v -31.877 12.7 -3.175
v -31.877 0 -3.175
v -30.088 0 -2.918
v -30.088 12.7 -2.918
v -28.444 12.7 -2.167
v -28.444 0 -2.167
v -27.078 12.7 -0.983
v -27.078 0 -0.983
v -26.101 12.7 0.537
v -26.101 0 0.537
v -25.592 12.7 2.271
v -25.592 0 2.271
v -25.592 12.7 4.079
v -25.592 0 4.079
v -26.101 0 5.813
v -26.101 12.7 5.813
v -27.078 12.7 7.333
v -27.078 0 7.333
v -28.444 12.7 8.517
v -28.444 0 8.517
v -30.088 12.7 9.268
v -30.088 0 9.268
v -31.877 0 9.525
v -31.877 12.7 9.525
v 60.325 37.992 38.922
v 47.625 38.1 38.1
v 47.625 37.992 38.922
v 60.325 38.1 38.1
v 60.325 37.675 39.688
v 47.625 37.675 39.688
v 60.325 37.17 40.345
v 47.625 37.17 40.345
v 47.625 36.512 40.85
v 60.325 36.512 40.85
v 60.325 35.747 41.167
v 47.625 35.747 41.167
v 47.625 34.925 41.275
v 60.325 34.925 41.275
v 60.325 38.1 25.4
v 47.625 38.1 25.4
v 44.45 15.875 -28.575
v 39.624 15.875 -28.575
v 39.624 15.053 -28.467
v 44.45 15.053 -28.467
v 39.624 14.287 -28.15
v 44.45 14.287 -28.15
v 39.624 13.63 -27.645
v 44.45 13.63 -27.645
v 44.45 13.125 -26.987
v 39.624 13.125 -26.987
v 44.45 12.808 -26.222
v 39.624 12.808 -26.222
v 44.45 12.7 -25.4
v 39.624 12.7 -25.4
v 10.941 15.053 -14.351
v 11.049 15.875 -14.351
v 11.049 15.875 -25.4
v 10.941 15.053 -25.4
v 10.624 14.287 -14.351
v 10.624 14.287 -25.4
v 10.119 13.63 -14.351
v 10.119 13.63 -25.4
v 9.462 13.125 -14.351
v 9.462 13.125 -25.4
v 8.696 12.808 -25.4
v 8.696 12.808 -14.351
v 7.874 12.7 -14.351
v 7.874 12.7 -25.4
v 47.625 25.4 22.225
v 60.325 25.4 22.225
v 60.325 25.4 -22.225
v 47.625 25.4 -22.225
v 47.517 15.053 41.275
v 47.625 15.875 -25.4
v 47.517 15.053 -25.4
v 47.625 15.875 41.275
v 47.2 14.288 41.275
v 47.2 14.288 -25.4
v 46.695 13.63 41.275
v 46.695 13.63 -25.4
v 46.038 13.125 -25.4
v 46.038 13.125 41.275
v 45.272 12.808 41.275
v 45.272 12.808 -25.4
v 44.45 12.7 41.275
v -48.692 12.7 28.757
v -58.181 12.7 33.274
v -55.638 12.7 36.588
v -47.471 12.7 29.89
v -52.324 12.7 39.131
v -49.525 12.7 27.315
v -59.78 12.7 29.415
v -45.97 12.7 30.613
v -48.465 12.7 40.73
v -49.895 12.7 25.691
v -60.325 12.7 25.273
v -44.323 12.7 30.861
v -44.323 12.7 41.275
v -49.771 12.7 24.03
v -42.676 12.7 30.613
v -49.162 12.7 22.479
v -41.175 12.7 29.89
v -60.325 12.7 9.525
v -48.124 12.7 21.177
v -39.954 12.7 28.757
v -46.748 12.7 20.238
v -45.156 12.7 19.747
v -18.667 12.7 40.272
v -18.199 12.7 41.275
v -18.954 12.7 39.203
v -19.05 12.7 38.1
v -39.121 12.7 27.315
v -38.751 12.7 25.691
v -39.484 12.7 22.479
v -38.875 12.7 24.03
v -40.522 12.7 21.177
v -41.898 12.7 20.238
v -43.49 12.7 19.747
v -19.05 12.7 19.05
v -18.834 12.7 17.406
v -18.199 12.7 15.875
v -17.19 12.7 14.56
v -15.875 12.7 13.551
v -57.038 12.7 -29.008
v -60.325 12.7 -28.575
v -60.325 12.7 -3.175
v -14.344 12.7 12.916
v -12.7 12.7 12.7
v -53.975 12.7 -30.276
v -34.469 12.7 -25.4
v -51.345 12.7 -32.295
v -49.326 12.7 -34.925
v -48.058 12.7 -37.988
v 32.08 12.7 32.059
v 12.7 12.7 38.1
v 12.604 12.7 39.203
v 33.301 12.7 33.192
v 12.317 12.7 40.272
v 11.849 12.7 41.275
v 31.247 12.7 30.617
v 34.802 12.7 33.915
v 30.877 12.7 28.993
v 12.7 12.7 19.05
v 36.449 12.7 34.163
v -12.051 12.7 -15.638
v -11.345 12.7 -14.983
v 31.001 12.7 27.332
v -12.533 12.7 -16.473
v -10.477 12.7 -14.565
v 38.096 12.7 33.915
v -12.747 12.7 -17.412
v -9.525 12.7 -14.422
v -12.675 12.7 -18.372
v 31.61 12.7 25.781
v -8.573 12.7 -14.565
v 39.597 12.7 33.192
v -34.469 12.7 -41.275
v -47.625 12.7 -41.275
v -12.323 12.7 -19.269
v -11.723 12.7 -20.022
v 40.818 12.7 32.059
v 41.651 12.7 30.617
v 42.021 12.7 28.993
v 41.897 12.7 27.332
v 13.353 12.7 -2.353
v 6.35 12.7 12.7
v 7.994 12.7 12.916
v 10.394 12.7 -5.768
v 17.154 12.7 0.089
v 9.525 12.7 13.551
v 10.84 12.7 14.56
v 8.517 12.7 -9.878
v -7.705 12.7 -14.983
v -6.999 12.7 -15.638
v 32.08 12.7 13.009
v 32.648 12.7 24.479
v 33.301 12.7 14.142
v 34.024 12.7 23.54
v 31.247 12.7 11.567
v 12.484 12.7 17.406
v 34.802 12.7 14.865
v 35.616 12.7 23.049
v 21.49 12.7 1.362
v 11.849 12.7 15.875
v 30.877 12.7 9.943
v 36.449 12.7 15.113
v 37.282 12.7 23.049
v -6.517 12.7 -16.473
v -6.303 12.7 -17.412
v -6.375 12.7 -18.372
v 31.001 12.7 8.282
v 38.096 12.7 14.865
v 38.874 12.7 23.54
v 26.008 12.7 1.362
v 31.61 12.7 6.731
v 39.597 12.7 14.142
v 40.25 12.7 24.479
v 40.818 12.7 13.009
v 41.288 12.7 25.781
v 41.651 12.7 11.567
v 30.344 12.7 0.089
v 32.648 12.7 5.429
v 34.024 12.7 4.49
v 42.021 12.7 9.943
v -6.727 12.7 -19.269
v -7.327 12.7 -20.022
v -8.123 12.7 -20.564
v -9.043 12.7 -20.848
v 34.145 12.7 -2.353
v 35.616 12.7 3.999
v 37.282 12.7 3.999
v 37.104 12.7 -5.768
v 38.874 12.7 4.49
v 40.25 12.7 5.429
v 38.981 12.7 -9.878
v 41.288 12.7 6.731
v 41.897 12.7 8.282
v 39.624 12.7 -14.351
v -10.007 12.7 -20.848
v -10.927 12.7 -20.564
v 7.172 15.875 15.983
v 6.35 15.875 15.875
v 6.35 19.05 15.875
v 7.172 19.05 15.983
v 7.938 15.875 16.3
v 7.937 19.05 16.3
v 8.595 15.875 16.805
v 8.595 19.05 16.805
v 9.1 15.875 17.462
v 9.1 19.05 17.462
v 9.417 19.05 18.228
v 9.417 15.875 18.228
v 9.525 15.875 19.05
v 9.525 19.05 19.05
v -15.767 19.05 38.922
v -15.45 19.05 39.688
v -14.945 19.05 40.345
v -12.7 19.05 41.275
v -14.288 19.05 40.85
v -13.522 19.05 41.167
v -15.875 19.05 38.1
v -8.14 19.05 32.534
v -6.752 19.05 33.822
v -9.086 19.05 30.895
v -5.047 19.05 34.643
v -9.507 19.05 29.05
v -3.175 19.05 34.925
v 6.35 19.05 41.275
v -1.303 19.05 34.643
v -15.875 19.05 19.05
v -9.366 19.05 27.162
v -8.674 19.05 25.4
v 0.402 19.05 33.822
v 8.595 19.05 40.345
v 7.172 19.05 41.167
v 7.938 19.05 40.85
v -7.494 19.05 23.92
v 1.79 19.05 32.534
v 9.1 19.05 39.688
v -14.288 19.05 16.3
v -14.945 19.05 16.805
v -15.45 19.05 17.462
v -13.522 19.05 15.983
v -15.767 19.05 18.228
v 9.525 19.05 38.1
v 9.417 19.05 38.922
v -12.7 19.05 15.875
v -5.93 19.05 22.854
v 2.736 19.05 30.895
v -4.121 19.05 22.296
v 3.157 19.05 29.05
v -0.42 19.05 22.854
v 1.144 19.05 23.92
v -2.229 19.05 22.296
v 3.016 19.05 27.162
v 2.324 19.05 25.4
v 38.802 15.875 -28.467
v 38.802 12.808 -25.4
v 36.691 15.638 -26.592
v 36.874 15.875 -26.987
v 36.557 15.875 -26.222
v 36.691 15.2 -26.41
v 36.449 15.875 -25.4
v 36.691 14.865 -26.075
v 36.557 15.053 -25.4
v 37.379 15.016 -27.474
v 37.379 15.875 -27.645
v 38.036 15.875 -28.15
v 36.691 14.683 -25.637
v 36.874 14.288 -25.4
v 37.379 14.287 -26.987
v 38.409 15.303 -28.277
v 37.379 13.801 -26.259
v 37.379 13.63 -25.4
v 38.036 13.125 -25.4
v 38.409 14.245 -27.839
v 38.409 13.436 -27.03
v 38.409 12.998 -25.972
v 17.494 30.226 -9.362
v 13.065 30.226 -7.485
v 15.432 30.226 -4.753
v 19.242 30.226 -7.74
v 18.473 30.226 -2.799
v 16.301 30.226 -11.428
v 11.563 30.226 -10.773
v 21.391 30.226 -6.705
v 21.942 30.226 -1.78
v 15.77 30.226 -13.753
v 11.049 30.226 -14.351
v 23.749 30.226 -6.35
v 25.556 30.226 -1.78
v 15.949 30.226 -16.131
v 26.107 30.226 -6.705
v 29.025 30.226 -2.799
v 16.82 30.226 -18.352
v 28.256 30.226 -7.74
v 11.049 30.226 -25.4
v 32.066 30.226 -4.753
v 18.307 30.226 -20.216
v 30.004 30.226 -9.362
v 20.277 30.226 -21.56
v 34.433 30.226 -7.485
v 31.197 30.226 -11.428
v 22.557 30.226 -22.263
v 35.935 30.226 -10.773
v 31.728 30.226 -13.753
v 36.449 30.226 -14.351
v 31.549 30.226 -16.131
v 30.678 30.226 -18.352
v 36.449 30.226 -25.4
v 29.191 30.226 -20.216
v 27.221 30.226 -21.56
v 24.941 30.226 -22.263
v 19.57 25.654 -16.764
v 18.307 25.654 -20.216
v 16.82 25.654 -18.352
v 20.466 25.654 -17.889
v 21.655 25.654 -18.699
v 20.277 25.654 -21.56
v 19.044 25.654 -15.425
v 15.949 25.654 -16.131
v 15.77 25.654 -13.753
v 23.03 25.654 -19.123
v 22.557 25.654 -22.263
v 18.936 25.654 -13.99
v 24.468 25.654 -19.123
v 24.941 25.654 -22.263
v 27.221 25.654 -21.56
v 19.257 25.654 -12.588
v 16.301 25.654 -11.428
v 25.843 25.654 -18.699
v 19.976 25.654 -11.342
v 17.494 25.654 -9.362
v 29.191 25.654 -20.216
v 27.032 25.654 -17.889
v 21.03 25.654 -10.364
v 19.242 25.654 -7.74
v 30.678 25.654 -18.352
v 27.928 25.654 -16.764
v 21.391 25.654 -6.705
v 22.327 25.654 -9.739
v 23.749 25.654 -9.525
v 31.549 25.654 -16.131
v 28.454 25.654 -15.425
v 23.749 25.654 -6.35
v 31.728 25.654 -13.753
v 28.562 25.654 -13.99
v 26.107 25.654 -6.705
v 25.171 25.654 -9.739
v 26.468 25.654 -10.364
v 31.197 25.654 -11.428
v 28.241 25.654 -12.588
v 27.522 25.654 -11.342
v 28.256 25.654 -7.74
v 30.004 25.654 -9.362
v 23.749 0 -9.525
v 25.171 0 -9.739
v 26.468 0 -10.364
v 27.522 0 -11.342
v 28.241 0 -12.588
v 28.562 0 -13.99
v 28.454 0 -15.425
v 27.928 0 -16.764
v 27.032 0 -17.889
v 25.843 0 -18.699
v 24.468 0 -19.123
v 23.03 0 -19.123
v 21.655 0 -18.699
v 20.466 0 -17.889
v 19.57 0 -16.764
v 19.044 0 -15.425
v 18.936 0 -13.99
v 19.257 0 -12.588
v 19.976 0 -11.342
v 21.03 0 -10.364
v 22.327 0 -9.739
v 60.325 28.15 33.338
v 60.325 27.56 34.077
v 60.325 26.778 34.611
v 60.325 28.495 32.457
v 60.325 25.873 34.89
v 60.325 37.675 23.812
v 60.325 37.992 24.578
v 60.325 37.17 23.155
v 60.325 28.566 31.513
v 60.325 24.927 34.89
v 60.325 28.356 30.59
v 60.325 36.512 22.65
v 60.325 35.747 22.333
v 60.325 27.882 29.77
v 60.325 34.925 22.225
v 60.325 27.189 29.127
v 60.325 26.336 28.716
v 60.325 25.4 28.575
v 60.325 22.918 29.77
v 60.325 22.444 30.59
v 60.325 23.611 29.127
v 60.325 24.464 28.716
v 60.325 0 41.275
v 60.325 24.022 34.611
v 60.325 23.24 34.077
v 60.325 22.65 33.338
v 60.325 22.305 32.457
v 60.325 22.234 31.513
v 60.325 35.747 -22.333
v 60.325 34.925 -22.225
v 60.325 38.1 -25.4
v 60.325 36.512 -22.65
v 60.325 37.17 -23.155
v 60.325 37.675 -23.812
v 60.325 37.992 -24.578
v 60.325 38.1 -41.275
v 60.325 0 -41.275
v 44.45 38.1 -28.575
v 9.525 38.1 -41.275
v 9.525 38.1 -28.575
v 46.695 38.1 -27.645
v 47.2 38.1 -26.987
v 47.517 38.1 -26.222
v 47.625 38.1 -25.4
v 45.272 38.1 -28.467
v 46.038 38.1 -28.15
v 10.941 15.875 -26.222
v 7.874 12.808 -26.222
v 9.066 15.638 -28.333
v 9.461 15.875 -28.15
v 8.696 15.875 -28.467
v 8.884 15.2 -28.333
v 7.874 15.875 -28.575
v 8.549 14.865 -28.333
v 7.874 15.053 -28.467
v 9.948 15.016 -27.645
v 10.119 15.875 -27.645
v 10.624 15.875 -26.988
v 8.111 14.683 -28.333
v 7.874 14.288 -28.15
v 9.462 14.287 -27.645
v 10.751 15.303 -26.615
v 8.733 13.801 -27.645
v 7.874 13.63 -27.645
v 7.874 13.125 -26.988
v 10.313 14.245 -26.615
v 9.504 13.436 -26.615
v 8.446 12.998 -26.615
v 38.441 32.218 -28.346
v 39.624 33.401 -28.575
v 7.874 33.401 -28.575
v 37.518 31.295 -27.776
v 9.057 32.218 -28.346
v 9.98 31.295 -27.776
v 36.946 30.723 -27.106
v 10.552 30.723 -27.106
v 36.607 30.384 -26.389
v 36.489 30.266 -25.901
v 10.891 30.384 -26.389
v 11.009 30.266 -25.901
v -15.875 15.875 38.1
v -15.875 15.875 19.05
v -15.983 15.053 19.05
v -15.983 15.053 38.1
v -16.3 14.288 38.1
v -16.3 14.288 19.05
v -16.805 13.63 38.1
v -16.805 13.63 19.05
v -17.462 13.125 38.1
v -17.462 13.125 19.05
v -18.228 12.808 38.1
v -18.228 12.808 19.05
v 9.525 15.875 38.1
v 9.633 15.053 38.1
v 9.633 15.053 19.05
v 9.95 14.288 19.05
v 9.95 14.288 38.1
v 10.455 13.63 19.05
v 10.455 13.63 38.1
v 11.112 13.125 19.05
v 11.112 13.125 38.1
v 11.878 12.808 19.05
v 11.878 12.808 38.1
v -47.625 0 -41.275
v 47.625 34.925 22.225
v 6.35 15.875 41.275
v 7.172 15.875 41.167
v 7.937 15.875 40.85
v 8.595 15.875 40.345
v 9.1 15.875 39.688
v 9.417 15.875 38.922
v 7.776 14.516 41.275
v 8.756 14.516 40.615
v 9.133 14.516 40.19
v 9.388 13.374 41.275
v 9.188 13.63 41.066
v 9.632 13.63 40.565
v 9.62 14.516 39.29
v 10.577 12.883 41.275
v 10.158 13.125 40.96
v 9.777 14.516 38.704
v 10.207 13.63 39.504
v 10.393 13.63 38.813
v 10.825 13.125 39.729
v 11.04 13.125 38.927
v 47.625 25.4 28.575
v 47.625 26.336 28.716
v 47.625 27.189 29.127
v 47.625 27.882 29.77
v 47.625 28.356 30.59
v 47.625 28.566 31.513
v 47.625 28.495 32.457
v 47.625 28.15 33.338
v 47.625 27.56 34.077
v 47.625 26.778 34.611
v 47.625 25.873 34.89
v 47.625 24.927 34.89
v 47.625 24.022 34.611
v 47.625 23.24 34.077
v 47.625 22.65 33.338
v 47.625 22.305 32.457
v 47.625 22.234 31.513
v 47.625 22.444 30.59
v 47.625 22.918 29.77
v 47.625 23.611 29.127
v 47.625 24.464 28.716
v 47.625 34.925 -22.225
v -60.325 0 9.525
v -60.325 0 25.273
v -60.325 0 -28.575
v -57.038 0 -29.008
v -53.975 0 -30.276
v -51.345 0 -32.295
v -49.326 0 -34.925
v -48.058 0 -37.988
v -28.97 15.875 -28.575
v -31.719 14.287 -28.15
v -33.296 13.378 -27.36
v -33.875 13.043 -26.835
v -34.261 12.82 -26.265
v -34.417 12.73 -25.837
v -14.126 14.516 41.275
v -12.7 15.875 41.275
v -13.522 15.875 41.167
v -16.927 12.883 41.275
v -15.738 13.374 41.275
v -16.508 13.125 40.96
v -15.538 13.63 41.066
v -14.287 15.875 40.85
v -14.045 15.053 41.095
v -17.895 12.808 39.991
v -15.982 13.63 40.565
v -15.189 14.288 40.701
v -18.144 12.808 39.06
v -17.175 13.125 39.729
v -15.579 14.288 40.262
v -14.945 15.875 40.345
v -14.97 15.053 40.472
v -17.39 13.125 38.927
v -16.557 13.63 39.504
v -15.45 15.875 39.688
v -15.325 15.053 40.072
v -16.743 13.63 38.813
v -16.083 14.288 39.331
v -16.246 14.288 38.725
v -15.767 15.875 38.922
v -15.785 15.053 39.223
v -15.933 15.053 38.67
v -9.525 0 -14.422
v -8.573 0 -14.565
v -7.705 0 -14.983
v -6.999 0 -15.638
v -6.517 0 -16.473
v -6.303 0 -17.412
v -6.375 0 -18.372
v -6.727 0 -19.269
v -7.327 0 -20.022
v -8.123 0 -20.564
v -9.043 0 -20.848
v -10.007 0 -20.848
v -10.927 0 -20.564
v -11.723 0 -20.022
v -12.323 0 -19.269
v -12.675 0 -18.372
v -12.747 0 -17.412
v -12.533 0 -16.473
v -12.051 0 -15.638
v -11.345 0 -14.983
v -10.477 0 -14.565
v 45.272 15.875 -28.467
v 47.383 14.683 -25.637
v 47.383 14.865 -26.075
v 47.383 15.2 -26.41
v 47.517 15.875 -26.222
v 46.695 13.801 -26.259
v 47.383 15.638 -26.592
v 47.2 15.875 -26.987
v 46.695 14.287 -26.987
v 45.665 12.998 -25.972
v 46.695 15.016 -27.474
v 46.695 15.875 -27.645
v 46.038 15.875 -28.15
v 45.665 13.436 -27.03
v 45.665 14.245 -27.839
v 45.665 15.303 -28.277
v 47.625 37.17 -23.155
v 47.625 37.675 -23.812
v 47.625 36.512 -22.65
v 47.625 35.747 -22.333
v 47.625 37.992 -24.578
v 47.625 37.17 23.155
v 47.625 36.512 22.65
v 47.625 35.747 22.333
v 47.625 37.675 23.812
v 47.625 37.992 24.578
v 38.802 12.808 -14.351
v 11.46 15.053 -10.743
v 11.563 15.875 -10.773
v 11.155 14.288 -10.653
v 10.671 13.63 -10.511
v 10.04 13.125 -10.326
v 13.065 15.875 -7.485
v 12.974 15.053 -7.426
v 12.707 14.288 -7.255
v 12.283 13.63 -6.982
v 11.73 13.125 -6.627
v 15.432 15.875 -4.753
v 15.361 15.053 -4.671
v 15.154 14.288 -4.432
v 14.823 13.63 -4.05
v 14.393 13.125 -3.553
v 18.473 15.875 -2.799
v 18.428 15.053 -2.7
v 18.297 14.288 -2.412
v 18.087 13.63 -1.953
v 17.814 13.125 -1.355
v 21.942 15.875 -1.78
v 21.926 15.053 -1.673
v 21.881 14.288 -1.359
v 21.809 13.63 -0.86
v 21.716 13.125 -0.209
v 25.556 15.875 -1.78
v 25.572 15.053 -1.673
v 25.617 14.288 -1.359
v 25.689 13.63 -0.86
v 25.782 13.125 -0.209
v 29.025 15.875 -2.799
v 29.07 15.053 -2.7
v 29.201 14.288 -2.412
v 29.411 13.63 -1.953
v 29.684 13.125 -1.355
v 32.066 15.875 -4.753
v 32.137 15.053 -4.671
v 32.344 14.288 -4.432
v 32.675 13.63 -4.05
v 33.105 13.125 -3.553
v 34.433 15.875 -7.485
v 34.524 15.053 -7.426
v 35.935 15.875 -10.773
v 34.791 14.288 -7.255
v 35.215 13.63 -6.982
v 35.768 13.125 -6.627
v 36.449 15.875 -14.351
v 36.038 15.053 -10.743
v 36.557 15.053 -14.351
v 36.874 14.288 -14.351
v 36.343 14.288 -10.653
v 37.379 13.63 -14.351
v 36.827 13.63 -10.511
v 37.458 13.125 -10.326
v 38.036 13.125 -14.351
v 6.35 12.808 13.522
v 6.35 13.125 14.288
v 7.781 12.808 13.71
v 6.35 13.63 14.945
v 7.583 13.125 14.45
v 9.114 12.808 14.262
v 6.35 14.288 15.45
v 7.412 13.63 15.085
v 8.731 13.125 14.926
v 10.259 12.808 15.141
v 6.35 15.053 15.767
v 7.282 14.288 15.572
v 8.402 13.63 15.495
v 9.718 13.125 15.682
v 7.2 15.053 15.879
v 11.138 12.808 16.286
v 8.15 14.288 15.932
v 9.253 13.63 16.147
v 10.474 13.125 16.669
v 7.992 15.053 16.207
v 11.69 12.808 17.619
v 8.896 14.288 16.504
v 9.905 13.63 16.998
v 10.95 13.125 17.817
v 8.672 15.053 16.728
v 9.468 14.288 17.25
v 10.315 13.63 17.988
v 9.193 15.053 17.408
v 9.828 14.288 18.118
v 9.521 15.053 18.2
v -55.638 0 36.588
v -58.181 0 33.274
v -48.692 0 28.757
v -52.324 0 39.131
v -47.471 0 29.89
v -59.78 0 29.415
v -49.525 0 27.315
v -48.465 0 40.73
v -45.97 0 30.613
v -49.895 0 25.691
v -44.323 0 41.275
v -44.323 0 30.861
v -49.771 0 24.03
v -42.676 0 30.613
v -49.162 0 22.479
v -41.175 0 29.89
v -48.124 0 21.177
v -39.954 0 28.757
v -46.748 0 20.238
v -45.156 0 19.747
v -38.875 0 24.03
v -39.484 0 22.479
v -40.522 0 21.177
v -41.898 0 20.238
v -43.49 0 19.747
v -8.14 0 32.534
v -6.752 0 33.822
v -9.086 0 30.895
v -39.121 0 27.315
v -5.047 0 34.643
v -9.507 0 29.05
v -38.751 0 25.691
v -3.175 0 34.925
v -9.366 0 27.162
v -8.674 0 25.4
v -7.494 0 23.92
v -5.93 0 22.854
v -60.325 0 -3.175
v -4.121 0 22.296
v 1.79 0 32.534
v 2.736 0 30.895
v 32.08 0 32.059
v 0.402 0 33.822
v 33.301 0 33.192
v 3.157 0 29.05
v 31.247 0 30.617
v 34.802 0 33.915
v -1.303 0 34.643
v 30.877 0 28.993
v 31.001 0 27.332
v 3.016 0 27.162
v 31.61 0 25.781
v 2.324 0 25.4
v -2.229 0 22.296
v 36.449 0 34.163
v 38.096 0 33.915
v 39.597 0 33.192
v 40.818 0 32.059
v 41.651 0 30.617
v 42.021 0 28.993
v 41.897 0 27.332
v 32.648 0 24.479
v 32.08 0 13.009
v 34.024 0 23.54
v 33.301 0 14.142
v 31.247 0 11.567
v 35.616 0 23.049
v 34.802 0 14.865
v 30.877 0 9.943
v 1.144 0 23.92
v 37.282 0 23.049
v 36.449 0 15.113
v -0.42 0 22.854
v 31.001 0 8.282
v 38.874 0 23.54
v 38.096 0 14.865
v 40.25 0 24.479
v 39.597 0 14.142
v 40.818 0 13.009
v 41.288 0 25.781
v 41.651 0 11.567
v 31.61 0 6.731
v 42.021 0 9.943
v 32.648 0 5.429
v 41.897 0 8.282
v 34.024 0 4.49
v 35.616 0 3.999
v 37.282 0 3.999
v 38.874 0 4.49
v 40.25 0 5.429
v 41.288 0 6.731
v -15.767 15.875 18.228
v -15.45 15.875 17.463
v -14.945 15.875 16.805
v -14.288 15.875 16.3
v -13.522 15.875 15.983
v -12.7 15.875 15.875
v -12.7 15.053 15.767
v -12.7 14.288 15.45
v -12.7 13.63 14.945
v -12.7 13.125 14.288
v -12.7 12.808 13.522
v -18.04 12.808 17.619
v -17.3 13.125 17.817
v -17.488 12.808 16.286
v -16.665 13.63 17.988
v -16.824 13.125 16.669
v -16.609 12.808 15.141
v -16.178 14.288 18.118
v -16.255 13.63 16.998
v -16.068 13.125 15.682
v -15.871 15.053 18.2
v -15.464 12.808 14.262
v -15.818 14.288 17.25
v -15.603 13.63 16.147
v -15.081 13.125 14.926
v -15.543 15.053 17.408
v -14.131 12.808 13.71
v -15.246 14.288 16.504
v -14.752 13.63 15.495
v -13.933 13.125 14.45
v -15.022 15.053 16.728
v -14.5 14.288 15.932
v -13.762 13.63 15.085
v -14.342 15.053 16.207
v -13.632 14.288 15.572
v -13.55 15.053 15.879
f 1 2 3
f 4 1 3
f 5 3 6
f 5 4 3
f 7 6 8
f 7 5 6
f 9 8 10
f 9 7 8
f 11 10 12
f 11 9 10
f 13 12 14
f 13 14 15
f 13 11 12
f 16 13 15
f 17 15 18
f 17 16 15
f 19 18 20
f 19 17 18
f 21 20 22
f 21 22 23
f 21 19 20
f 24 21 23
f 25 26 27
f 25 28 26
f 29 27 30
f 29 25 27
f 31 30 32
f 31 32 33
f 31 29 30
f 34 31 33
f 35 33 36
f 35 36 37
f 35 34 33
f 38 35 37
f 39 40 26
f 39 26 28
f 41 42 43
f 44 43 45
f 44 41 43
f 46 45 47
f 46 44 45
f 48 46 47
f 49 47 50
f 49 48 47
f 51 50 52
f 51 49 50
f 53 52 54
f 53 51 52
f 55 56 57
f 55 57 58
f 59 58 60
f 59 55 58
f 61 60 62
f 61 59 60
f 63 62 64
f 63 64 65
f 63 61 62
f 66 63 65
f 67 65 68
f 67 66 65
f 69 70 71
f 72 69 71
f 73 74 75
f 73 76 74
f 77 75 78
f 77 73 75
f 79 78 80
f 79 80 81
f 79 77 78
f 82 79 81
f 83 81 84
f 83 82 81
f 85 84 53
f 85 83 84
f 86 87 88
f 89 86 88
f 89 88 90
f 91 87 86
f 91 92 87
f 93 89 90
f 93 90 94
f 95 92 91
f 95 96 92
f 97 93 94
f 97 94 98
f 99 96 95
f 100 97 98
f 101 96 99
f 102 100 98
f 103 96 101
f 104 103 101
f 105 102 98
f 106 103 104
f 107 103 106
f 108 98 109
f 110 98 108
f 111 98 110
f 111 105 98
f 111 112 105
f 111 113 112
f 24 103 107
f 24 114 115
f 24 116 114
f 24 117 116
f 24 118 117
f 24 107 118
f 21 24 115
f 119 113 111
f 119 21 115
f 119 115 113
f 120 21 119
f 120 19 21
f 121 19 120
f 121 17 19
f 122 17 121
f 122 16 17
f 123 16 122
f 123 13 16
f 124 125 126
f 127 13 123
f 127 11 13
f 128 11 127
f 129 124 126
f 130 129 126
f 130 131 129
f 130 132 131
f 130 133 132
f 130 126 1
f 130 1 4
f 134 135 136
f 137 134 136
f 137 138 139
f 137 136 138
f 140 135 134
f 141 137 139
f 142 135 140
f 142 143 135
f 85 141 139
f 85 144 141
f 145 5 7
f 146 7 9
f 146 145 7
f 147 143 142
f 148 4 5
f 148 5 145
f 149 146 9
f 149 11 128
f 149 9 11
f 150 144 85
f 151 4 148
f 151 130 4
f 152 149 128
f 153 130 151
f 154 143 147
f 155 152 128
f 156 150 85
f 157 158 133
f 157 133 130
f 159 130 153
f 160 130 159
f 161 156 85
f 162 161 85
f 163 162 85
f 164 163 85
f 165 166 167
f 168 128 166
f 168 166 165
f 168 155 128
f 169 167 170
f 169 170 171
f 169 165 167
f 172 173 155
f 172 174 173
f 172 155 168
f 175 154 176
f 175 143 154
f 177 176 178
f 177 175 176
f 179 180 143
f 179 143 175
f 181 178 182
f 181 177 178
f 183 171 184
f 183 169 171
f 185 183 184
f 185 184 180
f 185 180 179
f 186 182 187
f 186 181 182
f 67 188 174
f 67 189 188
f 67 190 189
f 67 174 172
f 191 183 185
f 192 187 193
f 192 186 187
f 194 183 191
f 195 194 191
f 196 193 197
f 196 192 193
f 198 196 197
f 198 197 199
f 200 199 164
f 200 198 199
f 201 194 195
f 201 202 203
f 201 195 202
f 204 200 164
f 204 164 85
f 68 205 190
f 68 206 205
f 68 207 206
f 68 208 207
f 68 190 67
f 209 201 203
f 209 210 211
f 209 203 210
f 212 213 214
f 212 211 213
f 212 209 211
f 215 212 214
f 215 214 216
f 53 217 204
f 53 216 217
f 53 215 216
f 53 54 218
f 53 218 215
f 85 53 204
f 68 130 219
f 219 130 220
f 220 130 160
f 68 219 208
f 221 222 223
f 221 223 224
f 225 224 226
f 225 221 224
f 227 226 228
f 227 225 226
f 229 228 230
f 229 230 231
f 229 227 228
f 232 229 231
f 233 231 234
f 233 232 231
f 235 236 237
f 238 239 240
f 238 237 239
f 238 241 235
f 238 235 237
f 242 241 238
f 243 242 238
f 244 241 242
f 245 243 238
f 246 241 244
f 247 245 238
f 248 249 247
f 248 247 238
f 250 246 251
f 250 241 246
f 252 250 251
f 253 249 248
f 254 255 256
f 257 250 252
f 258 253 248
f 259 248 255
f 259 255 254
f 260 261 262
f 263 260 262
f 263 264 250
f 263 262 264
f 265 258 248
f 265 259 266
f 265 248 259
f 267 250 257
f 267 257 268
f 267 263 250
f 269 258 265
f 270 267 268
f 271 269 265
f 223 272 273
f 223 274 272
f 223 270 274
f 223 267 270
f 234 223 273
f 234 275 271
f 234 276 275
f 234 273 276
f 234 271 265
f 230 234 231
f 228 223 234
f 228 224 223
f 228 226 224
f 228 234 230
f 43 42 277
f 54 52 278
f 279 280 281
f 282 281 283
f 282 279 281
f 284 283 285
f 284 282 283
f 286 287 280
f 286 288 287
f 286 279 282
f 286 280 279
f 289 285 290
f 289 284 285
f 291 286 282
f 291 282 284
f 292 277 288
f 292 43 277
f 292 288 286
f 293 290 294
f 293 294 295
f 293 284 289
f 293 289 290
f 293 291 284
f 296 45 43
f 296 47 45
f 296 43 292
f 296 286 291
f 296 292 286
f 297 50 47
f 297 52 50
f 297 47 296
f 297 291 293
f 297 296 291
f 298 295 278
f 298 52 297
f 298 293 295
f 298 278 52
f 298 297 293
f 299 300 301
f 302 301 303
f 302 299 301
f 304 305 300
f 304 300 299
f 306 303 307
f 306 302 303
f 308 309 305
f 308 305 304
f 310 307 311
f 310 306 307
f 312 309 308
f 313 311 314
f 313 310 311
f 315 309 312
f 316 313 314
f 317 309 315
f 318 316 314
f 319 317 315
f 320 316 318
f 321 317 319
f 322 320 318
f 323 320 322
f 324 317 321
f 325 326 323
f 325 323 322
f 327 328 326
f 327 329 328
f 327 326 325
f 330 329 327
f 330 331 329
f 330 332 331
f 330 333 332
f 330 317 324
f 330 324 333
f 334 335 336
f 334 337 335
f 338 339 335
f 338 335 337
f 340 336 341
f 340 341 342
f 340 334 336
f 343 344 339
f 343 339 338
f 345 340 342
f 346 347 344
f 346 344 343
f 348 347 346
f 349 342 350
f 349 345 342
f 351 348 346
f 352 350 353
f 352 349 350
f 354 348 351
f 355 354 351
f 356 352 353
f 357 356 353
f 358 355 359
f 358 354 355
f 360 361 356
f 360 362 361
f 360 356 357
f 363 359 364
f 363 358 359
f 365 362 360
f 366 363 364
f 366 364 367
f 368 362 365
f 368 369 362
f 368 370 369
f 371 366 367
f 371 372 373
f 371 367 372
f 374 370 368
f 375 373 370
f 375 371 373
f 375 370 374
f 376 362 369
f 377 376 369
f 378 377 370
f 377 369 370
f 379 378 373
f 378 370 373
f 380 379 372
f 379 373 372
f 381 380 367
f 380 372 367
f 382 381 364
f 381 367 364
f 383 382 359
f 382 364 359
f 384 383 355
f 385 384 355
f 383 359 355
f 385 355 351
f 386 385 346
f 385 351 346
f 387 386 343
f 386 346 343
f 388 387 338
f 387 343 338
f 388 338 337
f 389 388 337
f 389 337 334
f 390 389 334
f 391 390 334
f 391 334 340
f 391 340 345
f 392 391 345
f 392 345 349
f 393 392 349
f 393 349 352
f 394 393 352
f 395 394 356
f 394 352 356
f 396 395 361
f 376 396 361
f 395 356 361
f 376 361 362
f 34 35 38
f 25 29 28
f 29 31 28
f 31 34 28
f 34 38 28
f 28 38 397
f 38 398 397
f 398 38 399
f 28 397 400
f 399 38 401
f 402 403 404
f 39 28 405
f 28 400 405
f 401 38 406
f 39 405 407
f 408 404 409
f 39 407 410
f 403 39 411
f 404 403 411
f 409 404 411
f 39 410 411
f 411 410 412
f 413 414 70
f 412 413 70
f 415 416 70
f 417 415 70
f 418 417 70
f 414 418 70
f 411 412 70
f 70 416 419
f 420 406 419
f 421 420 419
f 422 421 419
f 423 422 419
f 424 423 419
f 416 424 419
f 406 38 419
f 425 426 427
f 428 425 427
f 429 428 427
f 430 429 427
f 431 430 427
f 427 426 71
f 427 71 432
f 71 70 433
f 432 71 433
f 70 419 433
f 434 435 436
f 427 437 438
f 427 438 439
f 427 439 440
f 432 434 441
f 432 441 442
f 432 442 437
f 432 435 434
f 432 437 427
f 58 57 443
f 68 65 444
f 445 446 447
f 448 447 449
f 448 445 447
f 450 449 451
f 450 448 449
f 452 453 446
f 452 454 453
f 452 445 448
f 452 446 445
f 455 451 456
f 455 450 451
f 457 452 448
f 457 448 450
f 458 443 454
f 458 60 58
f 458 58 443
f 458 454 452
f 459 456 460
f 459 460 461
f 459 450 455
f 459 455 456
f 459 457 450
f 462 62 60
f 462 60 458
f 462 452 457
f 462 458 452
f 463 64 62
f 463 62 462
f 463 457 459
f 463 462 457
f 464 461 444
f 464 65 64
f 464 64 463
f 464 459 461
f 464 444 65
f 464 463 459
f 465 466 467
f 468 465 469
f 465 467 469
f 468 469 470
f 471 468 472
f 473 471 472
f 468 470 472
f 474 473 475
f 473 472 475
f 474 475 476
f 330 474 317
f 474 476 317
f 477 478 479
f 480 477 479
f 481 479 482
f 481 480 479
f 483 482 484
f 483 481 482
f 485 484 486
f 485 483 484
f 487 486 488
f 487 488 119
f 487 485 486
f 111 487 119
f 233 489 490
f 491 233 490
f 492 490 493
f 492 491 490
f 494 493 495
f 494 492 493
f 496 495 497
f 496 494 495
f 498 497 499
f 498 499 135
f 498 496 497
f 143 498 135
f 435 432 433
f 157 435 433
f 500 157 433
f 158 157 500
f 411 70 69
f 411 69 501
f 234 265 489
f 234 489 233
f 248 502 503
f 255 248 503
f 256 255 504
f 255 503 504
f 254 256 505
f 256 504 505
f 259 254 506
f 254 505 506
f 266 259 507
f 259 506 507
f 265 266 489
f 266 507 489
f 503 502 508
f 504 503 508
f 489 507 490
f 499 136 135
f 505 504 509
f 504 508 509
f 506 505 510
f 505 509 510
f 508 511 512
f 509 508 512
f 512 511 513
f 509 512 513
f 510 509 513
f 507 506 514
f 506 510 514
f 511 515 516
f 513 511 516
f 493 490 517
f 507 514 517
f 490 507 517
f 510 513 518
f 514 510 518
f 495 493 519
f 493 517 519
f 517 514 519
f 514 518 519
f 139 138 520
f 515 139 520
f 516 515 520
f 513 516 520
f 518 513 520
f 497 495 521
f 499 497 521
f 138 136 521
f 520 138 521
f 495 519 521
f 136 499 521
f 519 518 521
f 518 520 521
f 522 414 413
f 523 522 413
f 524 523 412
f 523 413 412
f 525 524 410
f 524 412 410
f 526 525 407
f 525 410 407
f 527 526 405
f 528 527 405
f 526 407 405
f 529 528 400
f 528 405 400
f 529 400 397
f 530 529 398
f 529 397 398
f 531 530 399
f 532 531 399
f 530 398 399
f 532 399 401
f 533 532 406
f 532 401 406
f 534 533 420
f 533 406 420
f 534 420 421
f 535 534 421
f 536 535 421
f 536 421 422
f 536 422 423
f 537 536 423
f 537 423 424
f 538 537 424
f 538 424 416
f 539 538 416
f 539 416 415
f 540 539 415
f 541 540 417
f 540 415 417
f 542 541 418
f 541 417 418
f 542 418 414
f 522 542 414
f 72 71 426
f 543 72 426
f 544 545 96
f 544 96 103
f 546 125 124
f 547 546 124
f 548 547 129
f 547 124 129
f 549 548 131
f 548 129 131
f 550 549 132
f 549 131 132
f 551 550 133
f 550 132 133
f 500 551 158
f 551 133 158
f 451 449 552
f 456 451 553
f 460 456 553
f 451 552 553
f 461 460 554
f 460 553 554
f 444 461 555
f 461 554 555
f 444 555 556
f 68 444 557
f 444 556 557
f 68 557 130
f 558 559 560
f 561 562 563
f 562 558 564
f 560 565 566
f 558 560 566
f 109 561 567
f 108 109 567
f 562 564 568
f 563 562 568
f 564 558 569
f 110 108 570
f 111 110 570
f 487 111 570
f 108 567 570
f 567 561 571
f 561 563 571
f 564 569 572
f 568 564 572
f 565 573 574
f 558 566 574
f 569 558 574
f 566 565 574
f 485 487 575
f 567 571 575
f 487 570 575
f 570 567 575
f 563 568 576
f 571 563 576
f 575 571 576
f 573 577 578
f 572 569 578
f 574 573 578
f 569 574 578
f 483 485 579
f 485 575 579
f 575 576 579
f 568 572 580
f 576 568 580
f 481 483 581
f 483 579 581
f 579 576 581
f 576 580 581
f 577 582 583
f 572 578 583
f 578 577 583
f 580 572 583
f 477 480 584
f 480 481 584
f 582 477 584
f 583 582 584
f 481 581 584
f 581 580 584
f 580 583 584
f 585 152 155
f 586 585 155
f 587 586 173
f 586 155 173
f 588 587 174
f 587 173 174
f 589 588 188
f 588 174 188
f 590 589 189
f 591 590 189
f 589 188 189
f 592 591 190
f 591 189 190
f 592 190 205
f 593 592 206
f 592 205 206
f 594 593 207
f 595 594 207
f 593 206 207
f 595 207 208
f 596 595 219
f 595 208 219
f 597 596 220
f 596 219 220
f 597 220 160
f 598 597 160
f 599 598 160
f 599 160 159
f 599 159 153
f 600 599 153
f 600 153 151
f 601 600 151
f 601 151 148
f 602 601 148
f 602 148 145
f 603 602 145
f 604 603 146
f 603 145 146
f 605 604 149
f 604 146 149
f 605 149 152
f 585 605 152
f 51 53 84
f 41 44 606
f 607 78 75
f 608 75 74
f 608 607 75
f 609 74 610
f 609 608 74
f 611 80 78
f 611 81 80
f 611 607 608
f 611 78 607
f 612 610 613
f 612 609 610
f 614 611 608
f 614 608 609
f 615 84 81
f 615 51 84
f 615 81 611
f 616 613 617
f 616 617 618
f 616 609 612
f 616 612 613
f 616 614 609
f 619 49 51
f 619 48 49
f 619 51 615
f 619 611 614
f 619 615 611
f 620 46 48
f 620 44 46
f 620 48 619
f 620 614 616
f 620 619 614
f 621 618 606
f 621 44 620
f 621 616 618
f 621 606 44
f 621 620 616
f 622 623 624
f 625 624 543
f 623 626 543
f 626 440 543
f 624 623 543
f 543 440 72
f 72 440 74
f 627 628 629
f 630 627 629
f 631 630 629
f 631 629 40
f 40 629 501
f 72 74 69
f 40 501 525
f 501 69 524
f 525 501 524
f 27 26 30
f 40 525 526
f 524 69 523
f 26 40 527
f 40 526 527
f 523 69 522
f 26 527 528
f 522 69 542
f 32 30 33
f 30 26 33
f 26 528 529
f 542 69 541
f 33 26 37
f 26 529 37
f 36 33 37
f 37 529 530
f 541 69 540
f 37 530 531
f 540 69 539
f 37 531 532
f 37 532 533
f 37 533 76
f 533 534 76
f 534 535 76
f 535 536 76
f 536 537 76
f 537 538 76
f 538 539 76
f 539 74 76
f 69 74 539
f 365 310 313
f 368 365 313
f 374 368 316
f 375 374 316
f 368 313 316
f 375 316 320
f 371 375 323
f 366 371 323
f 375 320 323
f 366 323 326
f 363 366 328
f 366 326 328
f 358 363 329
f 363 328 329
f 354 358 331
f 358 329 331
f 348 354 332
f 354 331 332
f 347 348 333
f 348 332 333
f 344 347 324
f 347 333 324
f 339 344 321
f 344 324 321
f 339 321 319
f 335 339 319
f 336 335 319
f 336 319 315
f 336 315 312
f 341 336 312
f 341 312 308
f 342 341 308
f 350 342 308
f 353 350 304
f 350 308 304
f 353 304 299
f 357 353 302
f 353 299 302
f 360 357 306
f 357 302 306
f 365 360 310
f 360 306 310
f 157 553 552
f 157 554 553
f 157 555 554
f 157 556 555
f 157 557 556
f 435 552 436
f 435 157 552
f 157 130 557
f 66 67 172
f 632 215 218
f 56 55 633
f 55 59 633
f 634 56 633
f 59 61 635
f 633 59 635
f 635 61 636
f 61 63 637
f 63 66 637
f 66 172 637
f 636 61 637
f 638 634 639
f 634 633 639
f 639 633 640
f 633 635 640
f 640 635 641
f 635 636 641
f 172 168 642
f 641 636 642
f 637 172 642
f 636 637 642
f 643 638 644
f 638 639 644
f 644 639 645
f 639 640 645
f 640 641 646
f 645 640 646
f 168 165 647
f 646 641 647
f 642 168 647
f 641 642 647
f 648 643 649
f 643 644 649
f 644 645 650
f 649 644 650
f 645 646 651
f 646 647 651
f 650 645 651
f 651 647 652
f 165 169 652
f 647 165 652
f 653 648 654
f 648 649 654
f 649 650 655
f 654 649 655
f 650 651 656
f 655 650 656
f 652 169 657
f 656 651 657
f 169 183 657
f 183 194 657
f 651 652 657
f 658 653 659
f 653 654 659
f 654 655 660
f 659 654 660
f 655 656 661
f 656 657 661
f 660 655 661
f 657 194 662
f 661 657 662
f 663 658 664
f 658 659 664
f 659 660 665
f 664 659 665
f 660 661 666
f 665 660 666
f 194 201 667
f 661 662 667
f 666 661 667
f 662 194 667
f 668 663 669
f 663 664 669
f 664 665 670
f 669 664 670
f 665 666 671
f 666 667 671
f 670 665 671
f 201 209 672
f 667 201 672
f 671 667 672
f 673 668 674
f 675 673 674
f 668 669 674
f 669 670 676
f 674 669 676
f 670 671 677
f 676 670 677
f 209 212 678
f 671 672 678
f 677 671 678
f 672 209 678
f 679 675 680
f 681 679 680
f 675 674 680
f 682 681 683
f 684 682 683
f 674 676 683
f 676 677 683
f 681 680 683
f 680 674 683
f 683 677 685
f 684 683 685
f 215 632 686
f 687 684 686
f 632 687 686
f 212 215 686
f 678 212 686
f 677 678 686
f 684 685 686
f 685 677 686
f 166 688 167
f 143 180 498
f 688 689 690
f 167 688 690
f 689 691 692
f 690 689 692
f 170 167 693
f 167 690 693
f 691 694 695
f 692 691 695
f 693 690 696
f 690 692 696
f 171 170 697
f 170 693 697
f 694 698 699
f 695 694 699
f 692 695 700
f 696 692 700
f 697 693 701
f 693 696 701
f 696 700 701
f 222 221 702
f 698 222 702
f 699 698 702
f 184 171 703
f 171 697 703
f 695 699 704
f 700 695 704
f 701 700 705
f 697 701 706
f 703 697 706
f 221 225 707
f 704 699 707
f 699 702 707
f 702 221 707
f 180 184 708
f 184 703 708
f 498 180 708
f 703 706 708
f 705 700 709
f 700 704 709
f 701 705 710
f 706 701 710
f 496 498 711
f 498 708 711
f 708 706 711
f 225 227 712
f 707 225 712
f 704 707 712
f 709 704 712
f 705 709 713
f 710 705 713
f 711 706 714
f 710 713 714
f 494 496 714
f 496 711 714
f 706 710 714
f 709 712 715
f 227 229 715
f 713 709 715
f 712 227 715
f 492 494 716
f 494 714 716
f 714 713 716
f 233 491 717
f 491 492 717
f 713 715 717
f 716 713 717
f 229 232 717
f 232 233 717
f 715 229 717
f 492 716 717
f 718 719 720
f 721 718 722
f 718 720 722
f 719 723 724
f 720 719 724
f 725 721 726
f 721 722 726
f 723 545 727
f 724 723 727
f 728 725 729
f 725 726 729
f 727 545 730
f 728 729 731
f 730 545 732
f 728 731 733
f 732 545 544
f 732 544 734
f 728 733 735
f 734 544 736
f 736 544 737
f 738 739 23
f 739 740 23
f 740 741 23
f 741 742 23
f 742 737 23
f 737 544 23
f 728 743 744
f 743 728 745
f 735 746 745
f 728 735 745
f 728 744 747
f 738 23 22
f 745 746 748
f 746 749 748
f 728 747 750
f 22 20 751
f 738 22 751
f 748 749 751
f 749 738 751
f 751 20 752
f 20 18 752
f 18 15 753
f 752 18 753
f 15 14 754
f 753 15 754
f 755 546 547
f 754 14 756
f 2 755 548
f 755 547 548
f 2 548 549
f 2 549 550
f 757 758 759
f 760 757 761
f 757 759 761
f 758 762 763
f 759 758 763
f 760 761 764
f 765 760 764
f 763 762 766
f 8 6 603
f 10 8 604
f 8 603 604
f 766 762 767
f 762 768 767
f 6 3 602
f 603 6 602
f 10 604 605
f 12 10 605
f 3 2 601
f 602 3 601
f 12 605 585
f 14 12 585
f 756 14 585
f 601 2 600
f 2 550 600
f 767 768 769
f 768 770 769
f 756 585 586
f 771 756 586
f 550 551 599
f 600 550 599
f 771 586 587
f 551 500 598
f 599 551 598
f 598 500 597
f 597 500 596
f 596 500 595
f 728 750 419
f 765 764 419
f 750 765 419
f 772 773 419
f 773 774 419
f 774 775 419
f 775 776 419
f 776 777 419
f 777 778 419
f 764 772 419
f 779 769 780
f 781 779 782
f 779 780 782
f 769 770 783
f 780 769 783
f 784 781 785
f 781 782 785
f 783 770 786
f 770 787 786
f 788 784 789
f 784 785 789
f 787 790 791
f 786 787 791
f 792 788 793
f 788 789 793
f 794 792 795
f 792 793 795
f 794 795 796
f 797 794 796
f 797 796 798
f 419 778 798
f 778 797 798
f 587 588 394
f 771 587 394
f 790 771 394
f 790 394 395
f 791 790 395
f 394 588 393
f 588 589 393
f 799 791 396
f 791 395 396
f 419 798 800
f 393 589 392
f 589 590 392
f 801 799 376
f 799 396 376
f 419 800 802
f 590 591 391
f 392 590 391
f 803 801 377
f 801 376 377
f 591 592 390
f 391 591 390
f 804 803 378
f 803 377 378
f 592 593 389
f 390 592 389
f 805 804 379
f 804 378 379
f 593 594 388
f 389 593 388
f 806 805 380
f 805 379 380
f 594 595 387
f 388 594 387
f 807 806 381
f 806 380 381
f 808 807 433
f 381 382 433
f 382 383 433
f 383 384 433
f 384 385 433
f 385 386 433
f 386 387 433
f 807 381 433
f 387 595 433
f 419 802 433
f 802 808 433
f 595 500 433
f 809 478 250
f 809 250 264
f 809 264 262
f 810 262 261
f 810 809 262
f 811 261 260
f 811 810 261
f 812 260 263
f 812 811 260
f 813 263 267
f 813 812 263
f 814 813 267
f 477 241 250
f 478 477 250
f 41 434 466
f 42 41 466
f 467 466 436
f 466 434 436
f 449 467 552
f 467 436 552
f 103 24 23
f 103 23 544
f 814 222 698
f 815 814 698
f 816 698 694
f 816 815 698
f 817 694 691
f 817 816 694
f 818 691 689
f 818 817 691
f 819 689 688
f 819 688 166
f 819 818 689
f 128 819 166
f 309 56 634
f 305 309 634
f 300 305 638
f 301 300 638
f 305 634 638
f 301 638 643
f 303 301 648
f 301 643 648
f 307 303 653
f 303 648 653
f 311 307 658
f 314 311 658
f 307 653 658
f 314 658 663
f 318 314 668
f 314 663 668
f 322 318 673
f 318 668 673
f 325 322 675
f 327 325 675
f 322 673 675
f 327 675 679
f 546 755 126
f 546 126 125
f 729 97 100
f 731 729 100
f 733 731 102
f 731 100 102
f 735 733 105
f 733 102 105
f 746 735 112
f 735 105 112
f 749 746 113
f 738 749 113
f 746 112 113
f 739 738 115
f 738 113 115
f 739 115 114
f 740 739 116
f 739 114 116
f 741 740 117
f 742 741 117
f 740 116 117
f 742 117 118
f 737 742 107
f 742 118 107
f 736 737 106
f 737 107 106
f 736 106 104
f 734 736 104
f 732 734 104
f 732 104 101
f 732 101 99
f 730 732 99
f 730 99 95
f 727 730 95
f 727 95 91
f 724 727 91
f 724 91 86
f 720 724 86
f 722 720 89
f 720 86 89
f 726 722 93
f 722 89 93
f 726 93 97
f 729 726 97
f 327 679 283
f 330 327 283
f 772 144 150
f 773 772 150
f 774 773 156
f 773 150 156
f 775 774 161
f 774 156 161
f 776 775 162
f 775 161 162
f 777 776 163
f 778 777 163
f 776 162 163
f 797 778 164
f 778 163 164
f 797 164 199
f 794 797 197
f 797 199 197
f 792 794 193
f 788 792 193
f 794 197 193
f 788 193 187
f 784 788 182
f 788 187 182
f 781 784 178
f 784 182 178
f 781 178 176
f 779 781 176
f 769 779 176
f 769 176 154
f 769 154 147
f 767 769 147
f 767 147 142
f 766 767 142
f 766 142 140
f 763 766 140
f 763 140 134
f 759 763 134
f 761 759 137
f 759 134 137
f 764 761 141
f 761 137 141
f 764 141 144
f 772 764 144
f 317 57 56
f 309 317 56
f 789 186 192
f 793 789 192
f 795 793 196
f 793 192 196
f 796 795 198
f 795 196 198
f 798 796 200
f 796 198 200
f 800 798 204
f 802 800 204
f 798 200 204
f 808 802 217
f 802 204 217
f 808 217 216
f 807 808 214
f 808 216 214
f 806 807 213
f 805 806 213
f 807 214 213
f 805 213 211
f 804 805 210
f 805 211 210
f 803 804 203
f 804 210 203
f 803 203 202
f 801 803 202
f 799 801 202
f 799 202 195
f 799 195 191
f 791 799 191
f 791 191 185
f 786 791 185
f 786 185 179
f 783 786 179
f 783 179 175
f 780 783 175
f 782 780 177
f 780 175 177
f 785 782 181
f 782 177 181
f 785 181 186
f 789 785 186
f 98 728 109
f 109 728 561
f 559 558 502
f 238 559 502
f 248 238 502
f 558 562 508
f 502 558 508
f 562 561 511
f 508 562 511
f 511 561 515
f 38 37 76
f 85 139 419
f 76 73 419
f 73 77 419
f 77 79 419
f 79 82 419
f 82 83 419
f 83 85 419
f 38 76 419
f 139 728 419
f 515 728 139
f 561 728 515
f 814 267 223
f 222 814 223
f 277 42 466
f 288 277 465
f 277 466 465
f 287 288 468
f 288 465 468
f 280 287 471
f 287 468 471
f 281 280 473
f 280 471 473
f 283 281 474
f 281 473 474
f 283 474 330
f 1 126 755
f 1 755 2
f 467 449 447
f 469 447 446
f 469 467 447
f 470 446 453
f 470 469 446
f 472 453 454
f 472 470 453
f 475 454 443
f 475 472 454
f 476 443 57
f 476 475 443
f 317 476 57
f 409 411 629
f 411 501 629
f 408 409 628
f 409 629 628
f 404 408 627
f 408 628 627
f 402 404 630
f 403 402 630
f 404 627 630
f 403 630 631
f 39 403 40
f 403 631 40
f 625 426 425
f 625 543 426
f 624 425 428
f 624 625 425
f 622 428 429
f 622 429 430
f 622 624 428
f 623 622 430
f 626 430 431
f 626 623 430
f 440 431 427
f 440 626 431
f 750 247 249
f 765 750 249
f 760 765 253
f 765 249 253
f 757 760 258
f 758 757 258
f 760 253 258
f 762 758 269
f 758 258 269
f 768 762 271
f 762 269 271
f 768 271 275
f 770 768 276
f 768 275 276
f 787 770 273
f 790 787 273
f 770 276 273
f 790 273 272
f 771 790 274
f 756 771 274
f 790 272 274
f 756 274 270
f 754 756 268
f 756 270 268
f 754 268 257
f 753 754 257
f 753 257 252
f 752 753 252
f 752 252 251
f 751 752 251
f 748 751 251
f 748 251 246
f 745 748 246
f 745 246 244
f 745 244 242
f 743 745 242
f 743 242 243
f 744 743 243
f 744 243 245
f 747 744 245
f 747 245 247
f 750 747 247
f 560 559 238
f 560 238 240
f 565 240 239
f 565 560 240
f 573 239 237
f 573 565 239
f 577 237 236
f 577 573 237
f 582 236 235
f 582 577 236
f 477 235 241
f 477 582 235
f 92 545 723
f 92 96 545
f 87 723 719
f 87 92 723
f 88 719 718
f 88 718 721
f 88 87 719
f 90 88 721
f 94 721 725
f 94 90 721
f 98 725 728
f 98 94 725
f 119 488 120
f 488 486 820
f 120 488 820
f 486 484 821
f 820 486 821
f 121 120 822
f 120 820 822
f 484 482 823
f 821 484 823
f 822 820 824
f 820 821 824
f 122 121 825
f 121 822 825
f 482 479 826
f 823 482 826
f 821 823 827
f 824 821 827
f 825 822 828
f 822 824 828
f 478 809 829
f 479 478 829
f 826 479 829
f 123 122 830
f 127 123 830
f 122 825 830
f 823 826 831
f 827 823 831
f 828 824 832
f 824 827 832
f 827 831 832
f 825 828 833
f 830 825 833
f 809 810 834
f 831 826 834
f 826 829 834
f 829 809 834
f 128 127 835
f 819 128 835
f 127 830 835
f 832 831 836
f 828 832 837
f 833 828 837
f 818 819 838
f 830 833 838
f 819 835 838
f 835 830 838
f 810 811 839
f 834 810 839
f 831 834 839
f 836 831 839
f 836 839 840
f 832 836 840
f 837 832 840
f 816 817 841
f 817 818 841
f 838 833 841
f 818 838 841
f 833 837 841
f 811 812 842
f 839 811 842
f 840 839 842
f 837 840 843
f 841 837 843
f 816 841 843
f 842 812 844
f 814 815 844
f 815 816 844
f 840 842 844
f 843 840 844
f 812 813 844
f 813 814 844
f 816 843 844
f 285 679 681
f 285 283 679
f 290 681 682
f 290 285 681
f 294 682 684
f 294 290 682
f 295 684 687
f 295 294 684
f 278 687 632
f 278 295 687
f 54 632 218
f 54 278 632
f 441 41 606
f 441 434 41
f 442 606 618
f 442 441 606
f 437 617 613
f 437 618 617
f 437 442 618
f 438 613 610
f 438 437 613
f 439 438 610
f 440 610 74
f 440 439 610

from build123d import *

# Parameters (mm, degrees)
SKETCH1_W           = 120.65
SKETCH1_H           = 82.55
BOSS_EXTRUDE1_DEPTH = 12.7
FILLET1_R           = 16.002
SKETCH2_R           = 5.588
SKETCH2_R_2         = 3.231202494
SKETCH2_R_3         = 6.35
CUT_EXTRUDE1_DEPTH  = 12.7
BOSS_EXTRUDE2_START = 6.35
SKETCH2_5_W         = 25.4
SKETCH2_5_H         = 25.4
SKETCH2_5_R         = 6.35
BOSS_EXTRUDE2_DEPTH = 6.35
BOSS_EXTRUDE3_DEPTH = 25.4
BOSS_EXTRUDE4_DEPTH = 17.526
BOSS_EXTRUDE5_DEPTH = 12.7
FILLET2_R           = 3.175
FILLET3_R           = 3.175
FILLET4_R           = 3.175
SKETCH5_R           = 8.001
CUT_EXTRUDE2_DEPTH  = 4.572
SKETCH6_R           = 4.826
CUT_EXTRUDE3_DEPTH  = 25.654
SKETCH7_W           = 44.45
SKETCH7_H           = 12.7
CUT_EXTRUDE4_DEPTH  = 12.7
FILLET5_R           = 3.175
FILLET6_R           = 3.175
SKETCH8_R           = 3.175
CUT_EXTRUDE5_DEPTH  = 12.7


with BuildPart() as part:
    # Sketch1 → Boss-Extrude1 (new body)
    with BuildSketch(Plane(origin=(0, 0, 0), x_dir=(1, 0, 0), z_dir=(0, 1, 0))):
        Rectangle(SKETCH1_W, SKETCH1_H)
    extrude(amount=BOSS_EXTRUDE1_DEPTH)

    # Fillet1
    fillet1_edges = [part.edges().sort_by_distance(p)[0] for p in [
        (-60.325, 6.35, 41.275),
    ]]
    fillet(fillet1_edges, radius=FILLET1_R)

    # Sketch2 → Cut-Extrude1 (cut)
    with BuildSketch(Plane(origin=(0, 12.7, 0), x_dir=(1, 0, 0), z_dir=(0, 1, 0))):
        with Locations(Location((36.449, -9.525, 0), (0, 0, 270))):
            Circle(SKETCH2_R)
        with Locations(Location((36.449, -28.575, 0), (0, 0, 270))):
            Circle(SKETCH2_R)
        with Locations(Location((-9.525, 17.653, 0), (0, 0, 270))):
            Circle(SKETCH2_R_2)
        with Locations(Location((-44.323, -25.273, 0), (0, 0, 270))):
            Circle(SKETCH2_R)
        with Locations(Location((-3.175, -28.575, 0), (0, 0, 270))):
            Circle(SKETCH2_R_3)
        with BuildLine():
            Line((-47.625, 41.275), (-60.325, 41.275))
            Line((-60.325, 41.275), (-60.325, 28.575))
            ThreePointArc((-60.325, 28.575), (-51.344743879, 32.294743879), (-47.625, 41.275))
        make_face()
        with BuildLine():
            Line((-60.325, 3.175), (-31.877, 3.175))
            ThreePointArc((-31.877, 3.175), (-25.527, -3.175), (-31.877, -9.525))
            Line((-31.877, -9.525), (-60.325, -9.525))
            Line((-60.325, -9.525), (-60.325, 3.175))
        make_face()
    extrude(amount=-CUT_EXTRUDE1_DEPTH, mode=Mode.SUBTRACT)

    # Sketch2<5> → Boss-Extrude2 (add)
    with BuildSketch(Plane(origin=(0, 12.7, 0), x_dir=(1, 0, 0), z_dir=(0, 1, 0)).offset(BOSS_EXTRUDE2_START)):
        with Locations((-3.175, -28.575)):
            Rectangle(SKETCH2_5_W, SKETCH2_5_H)
        with Locations(Location((-3.175, -28.575, 0), (0, 0, 270))):
            Circle(SKETCH2_5_R, mode=Mode.SUBTRACT)
    extrude(amount=-BOSS_EXTRUDE2_DEPTH)

    # Sketch2<6> → Boss-Extrude3 (add)
    with BuildSketch(Plane(origin=(0, 12.7, 0), x_dir=(1, 0, 0), z_dir=(0, 1, 0))):
        Polygon((60.325, -41.275), (60.325, 41.275), (9.525, 41.275), (9.525, 28.575), (47.625, 28.575), (47.625, -41.275), align=None)
    extrude(amount=BOSS_EXTRUDE3_DEPTH)

    # Sketch2<10> → Boss-Extrude4 (add)
    with BuildSketch(Plane(origin=(0, 12.7, 0), x_dir=(1, 0, 0), z_dir=(0, 1, 0))):
        with BuildLine():
            Line((11.049, 28.575), (11.049, 14.351))
            ThreePointArc((11.049, 14.351), (23.749, 1.651), (36.449, 14.351))
            Line((36.449, 14.351), (36.449, 28.575))
            Line((36.449, 28.575), (11.049, 28.575))
        make_face()
    extrude(amount=BOSS_EXTRUDE4_DEPTH)

    # Sketch4 → Boss-Extrude5 (add)
    with BuildSketch(Plane(origin=(0, 0, -41.275), x_dir=(-1, 0, 0), z_dir=(0, 0, -1))):
        Polygon((-9.525, 38.1), (-9.525, 12.7), (34.469090512, 12.7), align=None)
    extrude(amount=-BOSS_EXTRUDE5_DEPTH)

    # Fillet2
    fillet2_edges = [part.edges().sort_by_distance(p)[0] for p in [
        (42.037, 12.7, -28.575),
        (36.449, 21.463, -28.575),
        (11.049, 12.7, -21.463),
        (11.049, 21.463, -28.575),
        (23.749, 12.7, -1.651),
        (36.449, 12.7, -21.463),
        (23.749, 30.226, -28.575),
        (-11.710045256, 12.7, -28.575),
        (47.625, 12.7, 6.35),
        (47.625, 25.4, -28.575),
    ]]
    fillet(fillet2_edges, radius=FILLET2_R)

    # Fillet3
    fillet3_edges = [part.edges().sort_by_distance(p)[0] for p in [
        (9.525, 15.875, 15.875),
        (-15.875, 15.875, 15.875),
        (-15.875, 15.875, 41.275),
        (9.525, 15.875, 41.275),
    ]]
    fillet(fillet3_edges, radius=FILLET3_R)

    # Fillet4
    # the kernel refuses this fillet: 3.175 mm, written as the material it adds along each edge
    with BuildSketch(Plane(origin=(9.525, 12.7, 19.05), x_dir=(0, 1, 0), z_dir=(0, 0, 1)), Plane(origin=(-12.7, 12.7, 15.875), x_dir=(0, 1, 0), z_dir=(1, 0, 0)), Plane(origin=(-15.875, 12.7, 38.1), x_dir=(0, 1, 0), z_dir=(0, 0, -1))) as fillet4_piece_1:
        with BuildLine():
            CenterArc((FILLET4_R, -FILLET4_R), FILLET4_R, 90, 90)
            Line((0, -FILLET4_R), (0, 0))
            Line((0, 0), (FILLET4_R, 0))
        make_face()
    extrude(amount=19.05)
    with BuildSketch(Plane(origin=(6.35, 12.7, 38.1), x_dir=(-0.5976672776328281, 0, -0.8017442392976478), z_dir=(0.8017442392976478, 0, -0.5976672776328281))) as fillet4_piece_2_section:
        with BuildLine():
            CenterArc((3.175 + FILLET4_R, FILLET4_R), FILLET4_R, 180, 90)
            Line((3.175 + FILLET4_R, 0), (3.175, 0))
            Line((3.175, 0), (3.175, FILLET4_R))
        make_face()
    fillet4_piece_2 = revolve(axis=Axis((6.35, 12.7, 38.1), (0, 1, 0)), revolution_arc=233.296989237, mode=Mode.PRIVATE)
    fillet4_piece_2 = split(fillet4_piece_2, bisect_by=Plane(origin=(8.731056041, 13.689420087, 41.275), z_dir=(0, 0, -1)), keep=Keep.TOP, mode=Mode.PRIVATE)
    add(fillet4_piece_2)
    with BuildSketch(Plane(origin=(6.35, 12.7, 19.05), x_dir=(0, 0, -1), z_dir=(-1, 0, 0))) as fillet4_piece_3:
        with BuildLine():
            CenterArc((3.175 + FILLET4_R, -FILLET4_R), FILLET4_R, 90, 90)
            Line((3.175 + FILLET4_R, 0), (3.175, 0))
            Line((3.175, 0), (3.175, -FILLET4_R))
        make_face()
    revolve(axis=Axis((6.35, 12.7, 19.05), (0, -1, 0)), revolution_arc=90)
    with BuildSketch(Plane(origin=(-12.7, 12.7, 19.05), x_dir=(-1, 0, 0), z_dir=(0, 0, 1))) as fillet4_piece_4:
        with BuildLine():
            CenterArc((3.175 + FILLET4_R, -FILLET4_R), FILLET4_R, 90, 90)
            Line((3.175 + FILLET4_R, 0), (3.175, 0))
            Line((3.175, 0), (3.175, -FILLET4_R))
        make_face()
    revolve(axis=Axis((-12.7, 12.7, 19.05), (0, -1, 0)), revolution_arc=90)
    with BuildSketch(Plane(origin=(-12.7, 12.7, 38.1), x_dir=(0.5976672776328279, 0, -0.8017442392976479), z_dir=(-0.8017442392976479, 0, -0.5976672776328279))) as fillet4_piece_5_section:
        with BuildLine():
            CenterArc((3.175 + FILLET4_R, -FILLET4_R), FILLET4_R, 90, 90)
            Line((3.175, -FILLET4_R), (3.175, 0))
            Line((3.175, 0), (3.175 + FILLET4_R, 0))
        make_face()
    fillet4_piece_5 = revolve(axis=Axis((-12.7, 12.7, 38.1), (0, -1, 0)), revolution_arc=233.296989237, mode=Mode.PRIVATE)
    fillet4_piece_5 = split(fillet4_piece_5, bisect_by=Plane(origin=(-15.081056252, 13.689419911, 41.275), z_dir=(0, 0, -1)), keep=Keep.TOP, mode=Mode.PRIVATE)
    add(fillet4_piece_5)

    # Sketch5 → Cut-Extrude2 (cut)
    with BuildSketch(Plane(origin=(0, 30.226, 0), x_dir=(1, 0, 0), z_dir=(0, 1, 0))):
        with Locations(Location((23.749, 14.351, 0), (0, 0, 270))):
            Circle(SKETCH5_R)
    extrude(amount=-CUT_EXTRUDE2_DEPTH, mode=Mode.SUBTRACT)

    # Sketch6 → Cut-Extrude3 (cut)
    with BuildSketch(Plane(origin=(0, 25.654, 0), x_dir=(1, 0, 0), z_dir=(0, 1, 0))):
        with Locations(Location((23.749, 14.351, 0), (0, 0, 270))):
            Circle(SKETCH6_R)
    extrude(amount=-CUT_EXTRUDE3_DEPTH, mode=Mode.SUBTRACT)

    # Sketch7 → Cut-Extrude4 (cut)
    with BuildSketch(Plane(origin=(60.325, 0, 0), x_dir=(0, 0, -1), z_dir=(1, 0, 0))):
        with Locations((0, 31.75)):
            Rectangle(SKETCH7_W, SKETCH7_H)
    extrude(amount=-CUT_EXTRUDE4_DEPTH, mode=Mode.SUBTRACT)

    # Fillet5
    fillet5_edges = [part.edges().sort_by_distance(p)[0] for p in [
        (53.975, 38.1, -22.225),
    ]]
    fillet(fillet5_edges, radius=FILLET5_R)

    # Fillet6
    fillet6_edges = [part.edges().sort_by_distance(p)[0] for p in [
        (53.975, 38.1, 22.225),
        (53.975, 38.1, 41.275),
    ]]
    fillet(fillet6_edges, radius=FILLET6_R)

    # Sketch8 → Cut-Extrude5 (cut)
    with BuildSketch(Plane(origin=(60.325, 0, 0), x_dir=(0, 0, -1), z_dir=(1, 0, 0))):
        with Locations((-31.75, 25.4)):
            Circle(SKETCH8_R)
    extrude(amount=-CUT_EXTRUDE5_DEPTH, mode=Mode.SUBTRACT)


solid = part.part
